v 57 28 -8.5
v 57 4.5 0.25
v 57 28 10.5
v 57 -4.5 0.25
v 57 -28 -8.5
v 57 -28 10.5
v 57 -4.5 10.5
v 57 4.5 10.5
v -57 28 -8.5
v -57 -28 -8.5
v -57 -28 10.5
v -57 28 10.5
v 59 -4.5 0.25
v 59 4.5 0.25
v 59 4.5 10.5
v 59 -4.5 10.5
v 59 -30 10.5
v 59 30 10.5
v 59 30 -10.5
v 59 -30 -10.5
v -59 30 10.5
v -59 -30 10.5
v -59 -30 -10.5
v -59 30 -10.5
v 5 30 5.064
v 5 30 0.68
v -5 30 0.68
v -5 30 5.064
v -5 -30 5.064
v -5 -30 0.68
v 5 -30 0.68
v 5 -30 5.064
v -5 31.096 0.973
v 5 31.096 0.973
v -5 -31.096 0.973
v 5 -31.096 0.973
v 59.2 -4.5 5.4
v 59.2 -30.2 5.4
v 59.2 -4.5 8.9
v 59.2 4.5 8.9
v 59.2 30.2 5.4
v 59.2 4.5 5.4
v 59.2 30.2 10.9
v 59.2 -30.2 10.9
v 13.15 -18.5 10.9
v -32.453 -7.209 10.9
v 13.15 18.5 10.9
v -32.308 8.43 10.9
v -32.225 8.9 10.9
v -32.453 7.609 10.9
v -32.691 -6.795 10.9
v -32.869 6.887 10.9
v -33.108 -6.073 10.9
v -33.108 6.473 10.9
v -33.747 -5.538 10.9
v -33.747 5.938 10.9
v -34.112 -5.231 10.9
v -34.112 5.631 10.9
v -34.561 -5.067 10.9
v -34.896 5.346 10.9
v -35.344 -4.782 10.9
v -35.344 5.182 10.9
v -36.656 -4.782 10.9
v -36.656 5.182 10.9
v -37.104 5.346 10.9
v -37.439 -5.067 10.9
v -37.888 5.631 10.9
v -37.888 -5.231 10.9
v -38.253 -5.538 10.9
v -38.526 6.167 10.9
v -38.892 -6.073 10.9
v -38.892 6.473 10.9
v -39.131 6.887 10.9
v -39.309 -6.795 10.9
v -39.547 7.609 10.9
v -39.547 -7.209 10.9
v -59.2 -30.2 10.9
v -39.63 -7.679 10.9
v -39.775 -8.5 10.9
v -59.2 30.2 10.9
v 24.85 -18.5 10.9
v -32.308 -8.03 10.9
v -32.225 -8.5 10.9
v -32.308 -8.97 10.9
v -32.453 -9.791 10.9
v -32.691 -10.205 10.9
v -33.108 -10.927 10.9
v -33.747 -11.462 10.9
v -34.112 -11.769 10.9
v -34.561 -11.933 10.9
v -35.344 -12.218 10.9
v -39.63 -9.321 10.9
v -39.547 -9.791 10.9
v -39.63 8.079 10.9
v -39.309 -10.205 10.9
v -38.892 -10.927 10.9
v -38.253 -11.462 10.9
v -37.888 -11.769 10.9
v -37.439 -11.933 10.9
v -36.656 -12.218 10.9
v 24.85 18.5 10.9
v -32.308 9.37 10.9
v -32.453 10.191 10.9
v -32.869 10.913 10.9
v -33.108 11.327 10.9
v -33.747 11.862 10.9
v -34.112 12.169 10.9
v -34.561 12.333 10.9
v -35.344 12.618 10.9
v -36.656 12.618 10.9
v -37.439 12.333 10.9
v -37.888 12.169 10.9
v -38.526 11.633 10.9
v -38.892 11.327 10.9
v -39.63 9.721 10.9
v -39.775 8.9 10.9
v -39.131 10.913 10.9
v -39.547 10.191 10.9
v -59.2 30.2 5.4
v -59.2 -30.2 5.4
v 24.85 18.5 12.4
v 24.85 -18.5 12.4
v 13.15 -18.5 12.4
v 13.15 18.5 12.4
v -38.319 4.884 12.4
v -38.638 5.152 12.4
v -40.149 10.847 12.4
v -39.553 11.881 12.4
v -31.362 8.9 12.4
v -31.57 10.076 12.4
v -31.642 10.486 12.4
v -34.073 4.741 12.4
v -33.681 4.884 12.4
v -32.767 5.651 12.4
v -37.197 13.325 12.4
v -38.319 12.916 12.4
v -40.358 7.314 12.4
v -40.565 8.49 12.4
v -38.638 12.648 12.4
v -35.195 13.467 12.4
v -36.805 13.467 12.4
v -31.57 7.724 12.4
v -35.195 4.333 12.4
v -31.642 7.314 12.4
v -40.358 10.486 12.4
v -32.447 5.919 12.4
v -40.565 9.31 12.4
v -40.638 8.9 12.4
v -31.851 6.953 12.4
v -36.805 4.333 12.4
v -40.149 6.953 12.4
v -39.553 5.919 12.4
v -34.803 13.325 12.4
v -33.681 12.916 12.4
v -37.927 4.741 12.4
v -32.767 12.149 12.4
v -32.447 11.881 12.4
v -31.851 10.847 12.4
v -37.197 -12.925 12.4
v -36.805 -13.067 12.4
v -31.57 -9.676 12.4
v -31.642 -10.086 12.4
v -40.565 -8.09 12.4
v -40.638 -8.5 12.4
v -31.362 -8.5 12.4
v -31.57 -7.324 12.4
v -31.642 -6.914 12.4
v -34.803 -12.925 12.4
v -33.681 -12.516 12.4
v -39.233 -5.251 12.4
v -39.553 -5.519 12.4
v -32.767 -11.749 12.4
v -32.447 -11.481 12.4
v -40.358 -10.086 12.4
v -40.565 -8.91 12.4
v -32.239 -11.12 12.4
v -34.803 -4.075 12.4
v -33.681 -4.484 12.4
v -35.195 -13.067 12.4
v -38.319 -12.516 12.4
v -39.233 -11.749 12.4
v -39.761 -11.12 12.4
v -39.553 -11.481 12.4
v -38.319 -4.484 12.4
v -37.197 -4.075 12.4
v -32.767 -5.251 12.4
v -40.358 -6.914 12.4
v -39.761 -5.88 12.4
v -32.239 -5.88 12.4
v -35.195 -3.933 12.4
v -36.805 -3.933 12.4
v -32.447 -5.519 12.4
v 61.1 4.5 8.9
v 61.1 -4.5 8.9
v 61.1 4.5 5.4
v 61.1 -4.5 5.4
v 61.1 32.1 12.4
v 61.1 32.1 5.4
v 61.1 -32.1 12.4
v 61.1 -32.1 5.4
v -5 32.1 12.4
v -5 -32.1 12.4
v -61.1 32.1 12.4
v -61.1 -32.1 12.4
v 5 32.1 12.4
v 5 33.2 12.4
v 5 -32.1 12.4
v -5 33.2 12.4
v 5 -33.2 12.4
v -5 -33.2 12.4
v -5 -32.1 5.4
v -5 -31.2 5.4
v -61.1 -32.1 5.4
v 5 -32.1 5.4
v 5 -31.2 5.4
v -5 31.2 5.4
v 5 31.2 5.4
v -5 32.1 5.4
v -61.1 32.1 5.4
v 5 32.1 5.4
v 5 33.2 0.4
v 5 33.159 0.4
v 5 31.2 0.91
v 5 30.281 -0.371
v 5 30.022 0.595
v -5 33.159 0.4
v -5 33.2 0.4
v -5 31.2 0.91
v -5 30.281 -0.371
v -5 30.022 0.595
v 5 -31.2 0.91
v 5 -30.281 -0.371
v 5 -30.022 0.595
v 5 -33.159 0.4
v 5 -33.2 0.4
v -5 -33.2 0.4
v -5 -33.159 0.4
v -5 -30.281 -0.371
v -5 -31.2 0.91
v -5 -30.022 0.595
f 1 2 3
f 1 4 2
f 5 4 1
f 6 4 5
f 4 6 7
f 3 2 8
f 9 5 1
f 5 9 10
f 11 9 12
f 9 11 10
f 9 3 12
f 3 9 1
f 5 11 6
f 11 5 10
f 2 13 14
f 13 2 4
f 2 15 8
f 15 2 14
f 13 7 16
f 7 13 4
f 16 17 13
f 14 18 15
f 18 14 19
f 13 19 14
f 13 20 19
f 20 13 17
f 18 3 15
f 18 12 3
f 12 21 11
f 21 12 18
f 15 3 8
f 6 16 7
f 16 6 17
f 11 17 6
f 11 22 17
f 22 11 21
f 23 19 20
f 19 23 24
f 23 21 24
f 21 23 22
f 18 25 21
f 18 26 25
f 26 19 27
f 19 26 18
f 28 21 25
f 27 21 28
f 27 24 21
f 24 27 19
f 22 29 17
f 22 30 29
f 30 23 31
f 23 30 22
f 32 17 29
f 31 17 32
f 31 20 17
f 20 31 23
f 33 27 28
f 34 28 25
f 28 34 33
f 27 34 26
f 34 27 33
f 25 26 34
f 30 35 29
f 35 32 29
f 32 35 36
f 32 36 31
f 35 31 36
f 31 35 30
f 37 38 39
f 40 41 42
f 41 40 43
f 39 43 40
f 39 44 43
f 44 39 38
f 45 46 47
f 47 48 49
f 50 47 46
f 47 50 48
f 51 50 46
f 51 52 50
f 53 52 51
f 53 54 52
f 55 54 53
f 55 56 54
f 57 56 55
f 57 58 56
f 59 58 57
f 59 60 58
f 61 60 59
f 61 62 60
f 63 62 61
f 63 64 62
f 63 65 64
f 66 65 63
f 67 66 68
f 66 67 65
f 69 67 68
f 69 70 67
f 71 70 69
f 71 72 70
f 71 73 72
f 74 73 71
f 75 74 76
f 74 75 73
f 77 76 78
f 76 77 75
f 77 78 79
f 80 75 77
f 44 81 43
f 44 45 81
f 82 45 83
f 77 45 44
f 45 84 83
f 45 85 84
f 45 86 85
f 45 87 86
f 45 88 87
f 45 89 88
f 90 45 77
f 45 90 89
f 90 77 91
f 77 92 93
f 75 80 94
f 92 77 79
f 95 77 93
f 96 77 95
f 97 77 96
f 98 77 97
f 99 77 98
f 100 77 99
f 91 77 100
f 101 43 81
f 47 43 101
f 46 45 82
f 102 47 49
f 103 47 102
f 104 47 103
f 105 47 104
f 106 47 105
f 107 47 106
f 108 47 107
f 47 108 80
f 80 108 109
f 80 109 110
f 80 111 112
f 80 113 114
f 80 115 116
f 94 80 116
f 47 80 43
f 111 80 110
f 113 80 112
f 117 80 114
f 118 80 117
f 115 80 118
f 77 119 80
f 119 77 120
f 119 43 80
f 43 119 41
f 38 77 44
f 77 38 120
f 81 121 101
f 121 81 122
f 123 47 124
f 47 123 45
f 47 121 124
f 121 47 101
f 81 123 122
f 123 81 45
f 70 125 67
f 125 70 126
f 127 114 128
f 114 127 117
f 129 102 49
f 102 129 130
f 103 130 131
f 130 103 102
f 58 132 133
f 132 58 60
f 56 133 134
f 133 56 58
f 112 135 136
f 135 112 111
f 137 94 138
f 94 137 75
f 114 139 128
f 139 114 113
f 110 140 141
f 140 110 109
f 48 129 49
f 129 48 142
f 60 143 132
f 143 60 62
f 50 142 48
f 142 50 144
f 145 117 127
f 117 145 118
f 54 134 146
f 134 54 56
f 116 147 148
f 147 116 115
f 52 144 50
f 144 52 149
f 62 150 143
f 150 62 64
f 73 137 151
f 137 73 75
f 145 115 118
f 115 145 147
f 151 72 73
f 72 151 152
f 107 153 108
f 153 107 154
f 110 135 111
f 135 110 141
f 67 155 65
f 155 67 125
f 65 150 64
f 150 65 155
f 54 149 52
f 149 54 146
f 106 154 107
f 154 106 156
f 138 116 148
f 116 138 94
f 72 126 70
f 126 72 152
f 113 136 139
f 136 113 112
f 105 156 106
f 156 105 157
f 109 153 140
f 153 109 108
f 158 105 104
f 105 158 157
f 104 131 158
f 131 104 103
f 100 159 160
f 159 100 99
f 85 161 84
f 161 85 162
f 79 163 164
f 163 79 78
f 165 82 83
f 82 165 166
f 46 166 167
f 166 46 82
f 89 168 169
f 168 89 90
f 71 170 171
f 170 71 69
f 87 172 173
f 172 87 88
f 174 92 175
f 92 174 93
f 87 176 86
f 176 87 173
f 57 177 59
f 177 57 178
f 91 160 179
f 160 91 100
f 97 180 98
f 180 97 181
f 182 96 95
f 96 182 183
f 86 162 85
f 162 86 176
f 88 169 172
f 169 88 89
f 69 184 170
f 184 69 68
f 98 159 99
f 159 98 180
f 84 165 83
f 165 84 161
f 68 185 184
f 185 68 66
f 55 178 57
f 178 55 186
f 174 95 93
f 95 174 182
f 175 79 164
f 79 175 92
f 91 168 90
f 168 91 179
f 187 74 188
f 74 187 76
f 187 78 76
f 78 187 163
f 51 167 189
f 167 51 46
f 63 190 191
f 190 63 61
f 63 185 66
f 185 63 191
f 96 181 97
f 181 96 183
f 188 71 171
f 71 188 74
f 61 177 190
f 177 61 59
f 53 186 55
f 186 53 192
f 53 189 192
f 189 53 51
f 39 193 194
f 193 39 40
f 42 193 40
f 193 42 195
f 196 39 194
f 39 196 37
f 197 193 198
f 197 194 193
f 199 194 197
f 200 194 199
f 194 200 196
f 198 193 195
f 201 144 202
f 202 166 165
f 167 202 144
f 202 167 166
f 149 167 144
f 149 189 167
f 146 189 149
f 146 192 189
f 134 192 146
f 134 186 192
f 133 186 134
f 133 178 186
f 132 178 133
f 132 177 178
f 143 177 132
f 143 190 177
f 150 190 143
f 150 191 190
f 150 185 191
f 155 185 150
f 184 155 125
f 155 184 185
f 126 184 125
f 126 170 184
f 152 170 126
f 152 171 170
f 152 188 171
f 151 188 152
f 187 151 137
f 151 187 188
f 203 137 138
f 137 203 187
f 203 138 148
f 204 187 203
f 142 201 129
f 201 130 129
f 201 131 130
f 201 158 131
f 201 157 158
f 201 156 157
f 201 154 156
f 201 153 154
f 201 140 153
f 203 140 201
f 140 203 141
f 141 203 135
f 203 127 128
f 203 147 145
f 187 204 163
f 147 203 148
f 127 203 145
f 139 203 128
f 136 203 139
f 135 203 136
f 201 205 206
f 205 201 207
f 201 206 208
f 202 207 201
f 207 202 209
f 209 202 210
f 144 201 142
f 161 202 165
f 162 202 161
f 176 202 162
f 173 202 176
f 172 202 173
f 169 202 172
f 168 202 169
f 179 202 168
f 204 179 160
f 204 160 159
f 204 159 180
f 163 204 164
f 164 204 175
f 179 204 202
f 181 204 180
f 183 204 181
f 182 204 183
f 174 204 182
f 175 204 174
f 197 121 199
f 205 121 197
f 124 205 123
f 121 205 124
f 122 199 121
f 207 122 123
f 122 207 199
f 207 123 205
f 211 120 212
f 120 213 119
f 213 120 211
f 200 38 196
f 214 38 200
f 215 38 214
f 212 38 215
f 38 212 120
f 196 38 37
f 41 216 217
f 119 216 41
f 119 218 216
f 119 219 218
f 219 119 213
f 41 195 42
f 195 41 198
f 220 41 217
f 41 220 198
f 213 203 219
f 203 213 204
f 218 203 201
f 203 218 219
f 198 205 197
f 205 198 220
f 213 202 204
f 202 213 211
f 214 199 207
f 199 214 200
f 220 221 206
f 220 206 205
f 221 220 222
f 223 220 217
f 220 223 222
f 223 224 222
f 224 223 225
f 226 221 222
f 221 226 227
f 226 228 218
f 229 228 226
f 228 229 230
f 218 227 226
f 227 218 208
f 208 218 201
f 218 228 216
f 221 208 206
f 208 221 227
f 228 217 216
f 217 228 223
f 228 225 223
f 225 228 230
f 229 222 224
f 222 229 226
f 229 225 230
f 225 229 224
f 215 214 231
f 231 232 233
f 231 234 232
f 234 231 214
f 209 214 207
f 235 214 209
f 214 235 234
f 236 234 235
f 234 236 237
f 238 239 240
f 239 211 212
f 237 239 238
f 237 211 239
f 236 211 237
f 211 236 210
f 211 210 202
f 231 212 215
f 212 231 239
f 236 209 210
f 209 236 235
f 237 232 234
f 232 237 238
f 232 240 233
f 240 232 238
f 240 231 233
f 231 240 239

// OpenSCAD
module case(){
	difference(){
		cube([118, 60, 21], center=true);
		union(){
			translate([0,0,2]) cube([114, 56, 21], center=true);
			translate([58, 0, 6]) cube([5, 9, 11.5], center=true);
		}
	}

	translate([0,29,3]) {
		rotate(a=-75, v=[1,0,0]) {
			linear_extrude(height=1.5) square([10,5], center=true);
		}
	}

	translate([0,-29,3]) {
		rotate(a=75, v=[1,0,0]) {
			linear_extrude(height=1.5) square([10,5], center=true);
		}
	}
}

module lid(height){


	difference(){
		//outer box
		translate([0,0,height]) cube([122.2, 64.2, 7], center=true);
		union(){
			//inner box
			translate([0,0,height-2]) cube([118.4, 60.4, 8], center=true);
			//screen hole
			translate([19, 0, height+3]) cube([11.7, 37, 4], center=true);
			//button holes
			translate([-36, 8.9, height+3]) cylinder(r1=3.2, r2=5.5, h=4, center=true); 
			translate([-36, -8.5, height+3]) cylinder(r1=3.2, r2=5.5, h=4, center=true); 
			//usb hole
			translate([60, 0, height-2.5]) cube([5, 9, 5], center=true);
		}
	}

	//left hook
	translate([0, 32.2, height-2.5]) cube([10, 2, 12], center=true);
	translate([0, 31.6, height-8.4]) rotate(a=15, v=[1,0,0]) cube([10, 3, 1], center=true);
	//right hook
	translate([0, -32.2, height-2.5]) cube([10, 2, 12], center=true);
	translate([0, -31.6, height-8.4]) rotate(a=-15, v=[1,0,0]) cube([10, 3, 1], center=true);
}

case();
lid(8.9);
